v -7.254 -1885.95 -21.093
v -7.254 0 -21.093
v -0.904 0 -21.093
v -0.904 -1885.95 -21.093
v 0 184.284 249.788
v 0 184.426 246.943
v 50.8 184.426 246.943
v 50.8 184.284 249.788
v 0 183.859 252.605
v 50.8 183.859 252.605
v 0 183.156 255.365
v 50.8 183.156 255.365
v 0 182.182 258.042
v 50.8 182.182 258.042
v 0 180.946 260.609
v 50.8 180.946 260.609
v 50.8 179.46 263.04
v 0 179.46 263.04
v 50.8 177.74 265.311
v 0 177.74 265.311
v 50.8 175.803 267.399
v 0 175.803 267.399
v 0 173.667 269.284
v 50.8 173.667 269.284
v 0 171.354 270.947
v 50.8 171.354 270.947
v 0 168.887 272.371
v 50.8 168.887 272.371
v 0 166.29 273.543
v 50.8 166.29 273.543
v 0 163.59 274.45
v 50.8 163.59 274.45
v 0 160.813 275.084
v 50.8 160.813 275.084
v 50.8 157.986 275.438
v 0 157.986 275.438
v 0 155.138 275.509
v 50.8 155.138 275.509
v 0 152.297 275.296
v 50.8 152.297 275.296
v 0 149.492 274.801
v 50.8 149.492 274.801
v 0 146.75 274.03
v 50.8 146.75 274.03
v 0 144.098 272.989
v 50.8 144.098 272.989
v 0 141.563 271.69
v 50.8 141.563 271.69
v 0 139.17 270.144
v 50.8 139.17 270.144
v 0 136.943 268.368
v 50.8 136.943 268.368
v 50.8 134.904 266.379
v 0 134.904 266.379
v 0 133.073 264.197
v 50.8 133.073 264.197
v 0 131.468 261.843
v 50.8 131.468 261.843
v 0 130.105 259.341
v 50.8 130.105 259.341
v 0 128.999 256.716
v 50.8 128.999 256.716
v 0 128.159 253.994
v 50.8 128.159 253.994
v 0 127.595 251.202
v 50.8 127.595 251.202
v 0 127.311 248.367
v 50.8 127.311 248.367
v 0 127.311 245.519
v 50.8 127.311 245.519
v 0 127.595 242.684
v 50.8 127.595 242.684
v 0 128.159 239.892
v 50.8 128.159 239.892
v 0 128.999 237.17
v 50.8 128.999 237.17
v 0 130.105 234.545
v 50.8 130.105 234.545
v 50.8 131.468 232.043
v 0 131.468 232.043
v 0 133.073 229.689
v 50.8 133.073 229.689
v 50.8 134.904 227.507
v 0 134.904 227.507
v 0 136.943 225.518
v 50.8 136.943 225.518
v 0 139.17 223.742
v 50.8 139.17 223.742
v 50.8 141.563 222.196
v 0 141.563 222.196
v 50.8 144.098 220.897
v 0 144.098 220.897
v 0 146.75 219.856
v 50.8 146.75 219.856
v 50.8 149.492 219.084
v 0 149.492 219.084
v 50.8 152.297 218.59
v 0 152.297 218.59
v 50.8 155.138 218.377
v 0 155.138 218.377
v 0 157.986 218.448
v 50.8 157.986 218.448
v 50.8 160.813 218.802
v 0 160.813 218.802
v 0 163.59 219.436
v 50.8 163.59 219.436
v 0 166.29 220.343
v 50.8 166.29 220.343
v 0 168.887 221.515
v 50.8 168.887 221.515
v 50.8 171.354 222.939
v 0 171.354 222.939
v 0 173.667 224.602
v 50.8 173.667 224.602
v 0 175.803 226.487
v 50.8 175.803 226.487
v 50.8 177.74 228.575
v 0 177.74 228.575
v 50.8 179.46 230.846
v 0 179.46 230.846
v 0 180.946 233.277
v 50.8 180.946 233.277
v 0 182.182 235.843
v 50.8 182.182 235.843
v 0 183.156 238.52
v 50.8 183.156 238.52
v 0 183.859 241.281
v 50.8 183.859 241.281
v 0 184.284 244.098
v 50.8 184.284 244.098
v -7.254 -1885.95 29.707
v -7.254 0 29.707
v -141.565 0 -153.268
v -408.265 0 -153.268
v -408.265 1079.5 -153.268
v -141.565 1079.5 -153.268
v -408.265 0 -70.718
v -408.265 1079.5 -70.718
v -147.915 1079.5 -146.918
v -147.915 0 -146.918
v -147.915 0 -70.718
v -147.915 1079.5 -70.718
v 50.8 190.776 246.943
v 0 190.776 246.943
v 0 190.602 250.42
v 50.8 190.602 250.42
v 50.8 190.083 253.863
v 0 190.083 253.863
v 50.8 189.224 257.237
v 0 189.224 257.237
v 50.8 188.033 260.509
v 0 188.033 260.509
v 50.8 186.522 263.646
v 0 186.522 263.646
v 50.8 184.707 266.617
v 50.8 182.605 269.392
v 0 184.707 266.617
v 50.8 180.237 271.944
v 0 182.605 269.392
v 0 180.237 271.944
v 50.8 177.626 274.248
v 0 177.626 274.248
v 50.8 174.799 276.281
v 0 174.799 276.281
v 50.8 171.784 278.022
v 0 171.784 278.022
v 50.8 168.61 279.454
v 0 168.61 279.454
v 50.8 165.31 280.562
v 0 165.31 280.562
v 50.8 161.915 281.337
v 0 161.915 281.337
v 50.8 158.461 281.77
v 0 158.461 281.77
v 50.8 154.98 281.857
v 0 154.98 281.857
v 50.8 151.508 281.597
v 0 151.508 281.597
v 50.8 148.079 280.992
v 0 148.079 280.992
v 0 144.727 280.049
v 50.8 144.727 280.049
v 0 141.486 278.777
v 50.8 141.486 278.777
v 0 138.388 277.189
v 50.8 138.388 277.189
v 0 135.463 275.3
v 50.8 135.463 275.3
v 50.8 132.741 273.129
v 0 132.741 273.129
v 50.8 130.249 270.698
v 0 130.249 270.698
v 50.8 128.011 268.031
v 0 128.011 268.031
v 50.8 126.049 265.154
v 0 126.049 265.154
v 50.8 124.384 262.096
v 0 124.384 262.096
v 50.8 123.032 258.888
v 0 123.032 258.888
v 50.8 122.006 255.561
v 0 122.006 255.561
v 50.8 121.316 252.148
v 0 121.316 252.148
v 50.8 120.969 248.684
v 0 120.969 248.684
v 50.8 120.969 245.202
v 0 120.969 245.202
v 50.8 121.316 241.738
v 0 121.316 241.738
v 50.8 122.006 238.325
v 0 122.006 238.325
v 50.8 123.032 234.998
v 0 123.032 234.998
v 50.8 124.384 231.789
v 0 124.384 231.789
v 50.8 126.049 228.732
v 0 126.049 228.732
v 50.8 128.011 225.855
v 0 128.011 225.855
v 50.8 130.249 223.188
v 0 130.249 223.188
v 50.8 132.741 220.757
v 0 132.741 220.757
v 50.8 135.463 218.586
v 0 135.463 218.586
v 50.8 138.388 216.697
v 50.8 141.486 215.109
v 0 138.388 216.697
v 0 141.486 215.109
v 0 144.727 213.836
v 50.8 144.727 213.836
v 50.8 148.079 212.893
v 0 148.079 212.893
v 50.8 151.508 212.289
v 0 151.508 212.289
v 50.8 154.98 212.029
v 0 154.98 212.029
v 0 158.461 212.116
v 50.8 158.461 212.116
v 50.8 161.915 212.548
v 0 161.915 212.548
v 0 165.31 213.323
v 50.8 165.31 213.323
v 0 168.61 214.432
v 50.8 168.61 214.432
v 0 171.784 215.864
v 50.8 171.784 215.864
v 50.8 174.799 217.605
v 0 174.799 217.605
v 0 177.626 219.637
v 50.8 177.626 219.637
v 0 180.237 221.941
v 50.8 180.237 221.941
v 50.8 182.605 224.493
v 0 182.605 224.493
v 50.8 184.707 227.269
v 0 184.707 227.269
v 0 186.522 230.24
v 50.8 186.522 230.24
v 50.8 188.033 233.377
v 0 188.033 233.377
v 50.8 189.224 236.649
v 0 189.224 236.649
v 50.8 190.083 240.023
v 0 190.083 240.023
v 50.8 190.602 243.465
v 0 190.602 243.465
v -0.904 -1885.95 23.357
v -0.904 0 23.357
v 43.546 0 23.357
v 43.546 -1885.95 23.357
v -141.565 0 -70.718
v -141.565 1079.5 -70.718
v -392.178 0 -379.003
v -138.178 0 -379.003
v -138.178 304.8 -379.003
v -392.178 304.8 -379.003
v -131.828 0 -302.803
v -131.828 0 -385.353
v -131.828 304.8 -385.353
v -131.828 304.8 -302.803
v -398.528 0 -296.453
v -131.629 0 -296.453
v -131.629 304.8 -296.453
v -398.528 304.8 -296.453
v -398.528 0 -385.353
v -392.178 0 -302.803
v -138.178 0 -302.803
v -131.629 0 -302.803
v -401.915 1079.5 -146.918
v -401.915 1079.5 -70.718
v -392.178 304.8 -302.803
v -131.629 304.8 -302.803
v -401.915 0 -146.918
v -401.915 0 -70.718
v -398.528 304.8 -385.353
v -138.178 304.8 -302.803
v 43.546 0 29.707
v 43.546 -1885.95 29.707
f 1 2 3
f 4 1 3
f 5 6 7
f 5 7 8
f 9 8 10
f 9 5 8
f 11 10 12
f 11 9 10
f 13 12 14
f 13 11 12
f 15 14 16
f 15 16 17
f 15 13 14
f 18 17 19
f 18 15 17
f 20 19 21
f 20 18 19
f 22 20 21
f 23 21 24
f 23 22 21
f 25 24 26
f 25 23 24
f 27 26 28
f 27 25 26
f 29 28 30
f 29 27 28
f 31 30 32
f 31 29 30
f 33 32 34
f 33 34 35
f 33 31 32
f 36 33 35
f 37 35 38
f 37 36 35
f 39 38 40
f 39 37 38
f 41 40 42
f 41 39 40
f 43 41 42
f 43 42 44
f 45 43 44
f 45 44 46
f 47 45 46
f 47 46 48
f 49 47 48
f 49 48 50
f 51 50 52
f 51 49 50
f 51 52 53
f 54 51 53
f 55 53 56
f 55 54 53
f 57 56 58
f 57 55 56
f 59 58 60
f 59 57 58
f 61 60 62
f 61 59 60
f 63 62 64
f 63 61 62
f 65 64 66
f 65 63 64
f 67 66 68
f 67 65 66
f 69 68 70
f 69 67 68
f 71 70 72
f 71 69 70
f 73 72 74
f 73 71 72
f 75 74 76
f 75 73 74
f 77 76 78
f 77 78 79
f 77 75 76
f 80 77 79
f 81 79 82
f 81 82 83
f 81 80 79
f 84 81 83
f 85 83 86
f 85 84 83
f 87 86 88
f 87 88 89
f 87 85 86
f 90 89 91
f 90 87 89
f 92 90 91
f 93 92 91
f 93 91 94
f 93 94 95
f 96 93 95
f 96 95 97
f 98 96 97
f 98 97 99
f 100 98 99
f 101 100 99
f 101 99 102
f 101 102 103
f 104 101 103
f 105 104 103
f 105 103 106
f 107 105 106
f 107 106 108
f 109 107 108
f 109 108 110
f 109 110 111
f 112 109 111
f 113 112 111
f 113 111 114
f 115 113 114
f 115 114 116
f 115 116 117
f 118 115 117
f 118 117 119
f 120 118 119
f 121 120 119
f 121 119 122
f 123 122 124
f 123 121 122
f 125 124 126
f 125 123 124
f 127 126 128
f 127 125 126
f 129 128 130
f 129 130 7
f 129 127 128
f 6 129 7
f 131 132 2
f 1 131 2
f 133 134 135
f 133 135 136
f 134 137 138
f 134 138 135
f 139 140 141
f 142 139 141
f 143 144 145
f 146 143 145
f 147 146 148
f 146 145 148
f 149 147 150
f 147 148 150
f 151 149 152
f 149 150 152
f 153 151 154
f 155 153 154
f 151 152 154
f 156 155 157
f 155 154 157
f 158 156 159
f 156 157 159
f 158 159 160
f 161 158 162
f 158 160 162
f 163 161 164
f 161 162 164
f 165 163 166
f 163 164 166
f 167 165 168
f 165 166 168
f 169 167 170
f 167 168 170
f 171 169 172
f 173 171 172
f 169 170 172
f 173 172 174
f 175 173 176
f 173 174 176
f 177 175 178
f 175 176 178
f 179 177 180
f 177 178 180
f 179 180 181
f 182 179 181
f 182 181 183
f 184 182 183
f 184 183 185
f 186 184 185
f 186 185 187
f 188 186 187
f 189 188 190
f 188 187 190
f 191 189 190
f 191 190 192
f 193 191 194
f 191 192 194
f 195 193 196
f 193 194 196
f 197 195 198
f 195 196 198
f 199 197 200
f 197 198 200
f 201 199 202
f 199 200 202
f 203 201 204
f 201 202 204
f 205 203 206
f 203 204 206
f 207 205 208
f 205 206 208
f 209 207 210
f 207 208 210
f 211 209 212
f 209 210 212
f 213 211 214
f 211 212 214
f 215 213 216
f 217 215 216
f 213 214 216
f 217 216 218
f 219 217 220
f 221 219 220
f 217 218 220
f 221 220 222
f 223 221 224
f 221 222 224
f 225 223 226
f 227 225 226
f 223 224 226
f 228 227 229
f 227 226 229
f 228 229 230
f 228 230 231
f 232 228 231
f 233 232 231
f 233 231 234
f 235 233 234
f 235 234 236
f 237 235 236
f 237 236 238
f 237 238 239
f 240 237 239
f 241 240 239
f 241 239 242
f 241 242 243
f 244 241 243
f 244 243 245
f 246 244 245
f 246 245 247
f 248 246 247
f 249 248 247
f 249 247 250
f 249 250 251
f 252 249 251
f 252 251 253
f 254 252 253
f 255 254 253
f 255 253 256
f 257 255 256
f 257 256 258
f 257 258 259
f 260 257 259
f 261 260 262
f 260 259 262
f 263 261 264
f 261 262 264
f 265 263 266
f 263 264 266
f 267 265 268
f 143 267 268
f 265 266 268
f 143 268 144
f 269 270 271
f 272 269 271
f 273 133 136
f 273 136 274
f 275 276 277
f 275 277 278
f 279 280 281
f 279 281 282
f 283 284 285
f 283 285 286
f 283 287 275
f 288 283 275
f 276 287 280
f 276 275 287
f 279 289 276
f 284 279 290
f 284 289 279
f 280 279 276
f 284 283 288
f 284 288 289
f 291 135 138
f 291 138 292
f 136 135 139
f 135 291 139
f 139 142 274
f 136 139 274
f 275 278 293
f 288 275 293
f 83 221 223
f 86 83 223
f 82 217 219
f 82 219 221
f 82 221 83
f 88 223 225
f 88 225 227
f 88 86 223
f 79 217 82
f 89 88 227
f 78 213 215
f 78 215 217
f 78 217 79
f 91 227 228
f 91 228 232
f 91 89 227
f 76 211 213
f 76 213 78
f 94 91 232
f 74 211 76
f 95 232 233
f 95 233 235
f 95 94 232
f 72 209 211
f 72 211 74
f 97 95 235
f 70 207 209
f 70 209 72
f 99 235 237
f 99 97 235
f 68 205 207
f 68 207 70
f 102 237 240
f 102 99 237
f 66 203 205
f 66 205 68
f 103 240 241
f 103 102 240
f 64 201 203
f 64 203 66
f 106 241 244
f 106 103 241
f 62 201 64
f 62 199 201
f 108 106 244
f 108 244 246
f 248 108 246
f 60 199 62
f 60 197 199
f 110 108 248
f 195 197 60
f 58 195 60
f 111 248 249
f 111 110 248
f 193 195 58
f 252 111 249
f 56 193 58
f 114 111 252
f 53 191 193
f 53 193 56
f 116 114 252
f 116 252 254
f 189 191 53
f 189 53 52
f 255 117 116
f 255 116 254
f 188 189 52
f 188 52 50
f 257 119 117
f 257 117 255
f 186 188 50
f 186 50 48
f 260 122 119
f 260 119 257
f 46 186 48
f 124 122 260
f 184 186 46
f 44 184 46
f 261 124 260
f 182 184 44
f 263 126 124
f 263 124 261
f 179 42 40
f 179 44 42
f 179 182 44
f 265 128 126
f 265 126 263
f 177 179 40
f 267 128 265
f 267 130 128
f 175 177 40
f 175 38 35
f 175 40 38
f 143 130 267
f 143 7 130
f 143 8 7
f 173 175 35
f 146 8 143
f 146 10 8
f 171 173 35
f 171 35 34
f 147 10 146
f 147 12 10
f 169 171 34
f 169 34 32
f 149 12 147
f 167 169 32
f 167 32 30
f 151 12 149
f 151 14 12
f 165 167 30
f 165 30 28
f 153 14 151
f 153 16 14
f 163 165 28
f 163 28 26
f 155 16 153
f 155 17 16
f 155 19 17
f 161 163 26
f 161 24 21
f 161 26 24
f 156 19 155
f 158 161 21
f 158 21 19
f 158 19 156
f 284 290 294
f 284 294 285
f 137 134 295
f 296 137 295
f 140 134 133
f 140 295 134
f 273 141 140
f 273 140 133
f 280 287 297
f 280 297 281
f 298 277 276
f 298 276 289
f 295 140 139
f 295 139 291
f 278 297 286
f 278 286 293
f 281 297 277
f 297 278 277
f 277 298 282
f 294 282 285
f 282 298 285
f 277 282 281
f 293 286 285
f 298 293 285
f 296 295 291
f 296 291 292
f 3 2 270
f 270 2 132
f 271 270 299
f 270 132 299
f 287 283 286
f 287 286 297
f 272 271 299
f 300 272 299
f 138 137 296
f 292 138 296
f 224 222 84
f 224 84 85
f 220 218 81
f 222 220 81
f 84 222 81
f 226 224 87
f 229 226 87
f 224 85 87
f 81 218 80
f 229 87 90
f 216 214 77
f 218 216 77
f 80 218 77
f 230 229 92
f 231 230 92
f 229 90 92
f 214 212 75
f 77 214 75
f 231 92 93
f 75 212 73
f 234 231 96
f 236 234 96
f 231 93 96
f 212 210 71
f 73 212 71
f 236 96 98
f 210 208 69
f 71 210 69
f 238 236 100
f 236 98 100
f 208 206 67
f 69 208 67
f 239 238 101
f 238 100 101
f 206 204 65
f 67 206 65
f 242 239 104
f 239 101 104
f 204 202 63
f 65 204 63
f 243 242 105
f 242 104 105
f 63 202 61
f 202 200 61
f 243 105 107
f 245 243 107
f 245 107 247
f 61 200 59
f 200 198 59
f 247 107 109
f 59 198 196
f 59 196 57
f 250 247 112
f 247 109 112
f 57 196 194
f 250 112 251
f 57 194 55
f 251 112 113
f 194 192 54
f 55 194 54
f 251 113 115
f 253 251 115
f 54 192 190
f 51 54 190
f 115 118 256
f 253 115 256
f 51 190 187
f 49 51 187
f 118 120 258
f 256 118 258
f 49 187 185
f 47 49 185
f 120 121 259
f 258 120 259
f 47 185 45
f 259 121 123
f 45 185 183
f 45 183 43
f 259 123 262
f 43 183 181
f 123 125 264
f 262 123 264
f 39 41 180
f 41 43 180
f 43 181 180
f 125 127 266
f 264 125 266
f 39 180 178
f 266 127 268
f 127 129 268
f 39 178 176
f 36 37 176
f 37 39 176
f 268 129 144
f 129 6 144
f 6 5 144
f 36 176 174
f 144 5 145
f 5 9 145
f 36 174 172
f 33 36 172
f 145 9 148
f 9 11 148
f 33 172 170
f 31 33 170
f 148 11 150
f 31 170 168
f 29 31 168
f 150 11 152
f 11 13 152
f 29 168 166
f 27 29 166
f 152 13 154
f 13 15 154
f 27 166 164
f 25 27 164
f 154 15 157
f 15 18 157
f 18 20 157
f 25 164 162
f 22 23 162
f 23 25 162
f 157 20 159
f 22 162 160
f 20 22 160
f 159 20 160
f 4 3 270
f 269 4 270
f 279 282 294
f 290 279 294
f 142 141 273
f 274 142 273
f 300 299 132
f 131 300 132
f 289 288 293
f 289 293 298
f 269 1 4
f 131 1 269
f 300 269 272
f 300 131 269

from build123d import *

# Parameters (mm, degrees)
F0_W     = 44.45
F0_H     = 6.35
F1_DEPTH = 1885.95
F2_R     = 34.925
F2_R_2   = 28.575
F3_DEPTH = 50.8
F4_W     = 6.35
F4_H     = 76.2
F5_DEPTH = 1079.5
F6_W     = 6.35
F6_H     = 76.2
F7_DEPTH = 304.8


with BuildPart() as f1:
    # F0 (on Front) → F1 (new body)
    with BuildSketch(Plane.XZ):
        Polygon((-7.253912, 29.706775), (-7.253912, -21.093225), (-0.903912, -21.093225), (-0.903912, 23.356775), (-0.903912, 29.706775), align=None)
        with Locations((21.321088, 26.531775)):
            Rectangle(F0_W, F0_H)
    extrude(amount=F1_DEPTH)


with BuildPart() as f3:
    # F2 (on Right) → F3 (new body)
    with BuildSketch(Plane.YZ):
        with Locations((155.850589, 246.942848)):
            Circle(F2_R)
        with Locations((155.850589, 246.942848)):
            Circle(F2_R_2, mode=Mode.SUBTRACT)
    extrude(amount=F3_DEPTH)


with BuildPart() as f5:
    # F4 (on Front) → F5 (new body)
    with BuildSketch(Plane.XZ):
        with Locations((-405.090099, -108.817868)):
            Rectangle(F4_W, F4_H)
        with Locations((-144.740099, -108.817868)):
            Rectangle(F4_W, F4_H)
        Polygon((-408.265099, -146.917868), (-408.265099, -153.267868), (-141.565099, -153.267868), (-141.565099, -146.917868), (-147.915099, -146.917868), (-401.915099, -146.917868), align=None)
    extrude(amount=-F5_DEPTH)


with BuildPart() as f7:
    # F6 (on Front) → F7 (new body)
    with BuildSketch(Plane.XZ):
        Polygon((-398.527593, -296.452982), (-398.527593, -302.802982), (-392.177593, -302.802982), (-138.177593, -302.802982), (-131.827593, -302.802982), (-131.628782, -302.802982), (-131.628782, -296.452982), align=None)
        with Locations((-395.352593, -340.902982)):
            Rectangle(F6_W, F6_H)
        Polygon((-398.527593, -379.002982), (-398.527593, -385.352982), (-131.827593, -385.352982), (-131.827593, -379.002982), (-138.177593, -379.002982), (-392.177593, -379.002982), align=None)
        with Locations((-135.002593, -340.902982)):
            Rectangle(F6_W, F6_H)
    extrude(amount=-F7_DEPTH)


solid = Compound([f1.part, f3.part, f5.part, f7.part])
